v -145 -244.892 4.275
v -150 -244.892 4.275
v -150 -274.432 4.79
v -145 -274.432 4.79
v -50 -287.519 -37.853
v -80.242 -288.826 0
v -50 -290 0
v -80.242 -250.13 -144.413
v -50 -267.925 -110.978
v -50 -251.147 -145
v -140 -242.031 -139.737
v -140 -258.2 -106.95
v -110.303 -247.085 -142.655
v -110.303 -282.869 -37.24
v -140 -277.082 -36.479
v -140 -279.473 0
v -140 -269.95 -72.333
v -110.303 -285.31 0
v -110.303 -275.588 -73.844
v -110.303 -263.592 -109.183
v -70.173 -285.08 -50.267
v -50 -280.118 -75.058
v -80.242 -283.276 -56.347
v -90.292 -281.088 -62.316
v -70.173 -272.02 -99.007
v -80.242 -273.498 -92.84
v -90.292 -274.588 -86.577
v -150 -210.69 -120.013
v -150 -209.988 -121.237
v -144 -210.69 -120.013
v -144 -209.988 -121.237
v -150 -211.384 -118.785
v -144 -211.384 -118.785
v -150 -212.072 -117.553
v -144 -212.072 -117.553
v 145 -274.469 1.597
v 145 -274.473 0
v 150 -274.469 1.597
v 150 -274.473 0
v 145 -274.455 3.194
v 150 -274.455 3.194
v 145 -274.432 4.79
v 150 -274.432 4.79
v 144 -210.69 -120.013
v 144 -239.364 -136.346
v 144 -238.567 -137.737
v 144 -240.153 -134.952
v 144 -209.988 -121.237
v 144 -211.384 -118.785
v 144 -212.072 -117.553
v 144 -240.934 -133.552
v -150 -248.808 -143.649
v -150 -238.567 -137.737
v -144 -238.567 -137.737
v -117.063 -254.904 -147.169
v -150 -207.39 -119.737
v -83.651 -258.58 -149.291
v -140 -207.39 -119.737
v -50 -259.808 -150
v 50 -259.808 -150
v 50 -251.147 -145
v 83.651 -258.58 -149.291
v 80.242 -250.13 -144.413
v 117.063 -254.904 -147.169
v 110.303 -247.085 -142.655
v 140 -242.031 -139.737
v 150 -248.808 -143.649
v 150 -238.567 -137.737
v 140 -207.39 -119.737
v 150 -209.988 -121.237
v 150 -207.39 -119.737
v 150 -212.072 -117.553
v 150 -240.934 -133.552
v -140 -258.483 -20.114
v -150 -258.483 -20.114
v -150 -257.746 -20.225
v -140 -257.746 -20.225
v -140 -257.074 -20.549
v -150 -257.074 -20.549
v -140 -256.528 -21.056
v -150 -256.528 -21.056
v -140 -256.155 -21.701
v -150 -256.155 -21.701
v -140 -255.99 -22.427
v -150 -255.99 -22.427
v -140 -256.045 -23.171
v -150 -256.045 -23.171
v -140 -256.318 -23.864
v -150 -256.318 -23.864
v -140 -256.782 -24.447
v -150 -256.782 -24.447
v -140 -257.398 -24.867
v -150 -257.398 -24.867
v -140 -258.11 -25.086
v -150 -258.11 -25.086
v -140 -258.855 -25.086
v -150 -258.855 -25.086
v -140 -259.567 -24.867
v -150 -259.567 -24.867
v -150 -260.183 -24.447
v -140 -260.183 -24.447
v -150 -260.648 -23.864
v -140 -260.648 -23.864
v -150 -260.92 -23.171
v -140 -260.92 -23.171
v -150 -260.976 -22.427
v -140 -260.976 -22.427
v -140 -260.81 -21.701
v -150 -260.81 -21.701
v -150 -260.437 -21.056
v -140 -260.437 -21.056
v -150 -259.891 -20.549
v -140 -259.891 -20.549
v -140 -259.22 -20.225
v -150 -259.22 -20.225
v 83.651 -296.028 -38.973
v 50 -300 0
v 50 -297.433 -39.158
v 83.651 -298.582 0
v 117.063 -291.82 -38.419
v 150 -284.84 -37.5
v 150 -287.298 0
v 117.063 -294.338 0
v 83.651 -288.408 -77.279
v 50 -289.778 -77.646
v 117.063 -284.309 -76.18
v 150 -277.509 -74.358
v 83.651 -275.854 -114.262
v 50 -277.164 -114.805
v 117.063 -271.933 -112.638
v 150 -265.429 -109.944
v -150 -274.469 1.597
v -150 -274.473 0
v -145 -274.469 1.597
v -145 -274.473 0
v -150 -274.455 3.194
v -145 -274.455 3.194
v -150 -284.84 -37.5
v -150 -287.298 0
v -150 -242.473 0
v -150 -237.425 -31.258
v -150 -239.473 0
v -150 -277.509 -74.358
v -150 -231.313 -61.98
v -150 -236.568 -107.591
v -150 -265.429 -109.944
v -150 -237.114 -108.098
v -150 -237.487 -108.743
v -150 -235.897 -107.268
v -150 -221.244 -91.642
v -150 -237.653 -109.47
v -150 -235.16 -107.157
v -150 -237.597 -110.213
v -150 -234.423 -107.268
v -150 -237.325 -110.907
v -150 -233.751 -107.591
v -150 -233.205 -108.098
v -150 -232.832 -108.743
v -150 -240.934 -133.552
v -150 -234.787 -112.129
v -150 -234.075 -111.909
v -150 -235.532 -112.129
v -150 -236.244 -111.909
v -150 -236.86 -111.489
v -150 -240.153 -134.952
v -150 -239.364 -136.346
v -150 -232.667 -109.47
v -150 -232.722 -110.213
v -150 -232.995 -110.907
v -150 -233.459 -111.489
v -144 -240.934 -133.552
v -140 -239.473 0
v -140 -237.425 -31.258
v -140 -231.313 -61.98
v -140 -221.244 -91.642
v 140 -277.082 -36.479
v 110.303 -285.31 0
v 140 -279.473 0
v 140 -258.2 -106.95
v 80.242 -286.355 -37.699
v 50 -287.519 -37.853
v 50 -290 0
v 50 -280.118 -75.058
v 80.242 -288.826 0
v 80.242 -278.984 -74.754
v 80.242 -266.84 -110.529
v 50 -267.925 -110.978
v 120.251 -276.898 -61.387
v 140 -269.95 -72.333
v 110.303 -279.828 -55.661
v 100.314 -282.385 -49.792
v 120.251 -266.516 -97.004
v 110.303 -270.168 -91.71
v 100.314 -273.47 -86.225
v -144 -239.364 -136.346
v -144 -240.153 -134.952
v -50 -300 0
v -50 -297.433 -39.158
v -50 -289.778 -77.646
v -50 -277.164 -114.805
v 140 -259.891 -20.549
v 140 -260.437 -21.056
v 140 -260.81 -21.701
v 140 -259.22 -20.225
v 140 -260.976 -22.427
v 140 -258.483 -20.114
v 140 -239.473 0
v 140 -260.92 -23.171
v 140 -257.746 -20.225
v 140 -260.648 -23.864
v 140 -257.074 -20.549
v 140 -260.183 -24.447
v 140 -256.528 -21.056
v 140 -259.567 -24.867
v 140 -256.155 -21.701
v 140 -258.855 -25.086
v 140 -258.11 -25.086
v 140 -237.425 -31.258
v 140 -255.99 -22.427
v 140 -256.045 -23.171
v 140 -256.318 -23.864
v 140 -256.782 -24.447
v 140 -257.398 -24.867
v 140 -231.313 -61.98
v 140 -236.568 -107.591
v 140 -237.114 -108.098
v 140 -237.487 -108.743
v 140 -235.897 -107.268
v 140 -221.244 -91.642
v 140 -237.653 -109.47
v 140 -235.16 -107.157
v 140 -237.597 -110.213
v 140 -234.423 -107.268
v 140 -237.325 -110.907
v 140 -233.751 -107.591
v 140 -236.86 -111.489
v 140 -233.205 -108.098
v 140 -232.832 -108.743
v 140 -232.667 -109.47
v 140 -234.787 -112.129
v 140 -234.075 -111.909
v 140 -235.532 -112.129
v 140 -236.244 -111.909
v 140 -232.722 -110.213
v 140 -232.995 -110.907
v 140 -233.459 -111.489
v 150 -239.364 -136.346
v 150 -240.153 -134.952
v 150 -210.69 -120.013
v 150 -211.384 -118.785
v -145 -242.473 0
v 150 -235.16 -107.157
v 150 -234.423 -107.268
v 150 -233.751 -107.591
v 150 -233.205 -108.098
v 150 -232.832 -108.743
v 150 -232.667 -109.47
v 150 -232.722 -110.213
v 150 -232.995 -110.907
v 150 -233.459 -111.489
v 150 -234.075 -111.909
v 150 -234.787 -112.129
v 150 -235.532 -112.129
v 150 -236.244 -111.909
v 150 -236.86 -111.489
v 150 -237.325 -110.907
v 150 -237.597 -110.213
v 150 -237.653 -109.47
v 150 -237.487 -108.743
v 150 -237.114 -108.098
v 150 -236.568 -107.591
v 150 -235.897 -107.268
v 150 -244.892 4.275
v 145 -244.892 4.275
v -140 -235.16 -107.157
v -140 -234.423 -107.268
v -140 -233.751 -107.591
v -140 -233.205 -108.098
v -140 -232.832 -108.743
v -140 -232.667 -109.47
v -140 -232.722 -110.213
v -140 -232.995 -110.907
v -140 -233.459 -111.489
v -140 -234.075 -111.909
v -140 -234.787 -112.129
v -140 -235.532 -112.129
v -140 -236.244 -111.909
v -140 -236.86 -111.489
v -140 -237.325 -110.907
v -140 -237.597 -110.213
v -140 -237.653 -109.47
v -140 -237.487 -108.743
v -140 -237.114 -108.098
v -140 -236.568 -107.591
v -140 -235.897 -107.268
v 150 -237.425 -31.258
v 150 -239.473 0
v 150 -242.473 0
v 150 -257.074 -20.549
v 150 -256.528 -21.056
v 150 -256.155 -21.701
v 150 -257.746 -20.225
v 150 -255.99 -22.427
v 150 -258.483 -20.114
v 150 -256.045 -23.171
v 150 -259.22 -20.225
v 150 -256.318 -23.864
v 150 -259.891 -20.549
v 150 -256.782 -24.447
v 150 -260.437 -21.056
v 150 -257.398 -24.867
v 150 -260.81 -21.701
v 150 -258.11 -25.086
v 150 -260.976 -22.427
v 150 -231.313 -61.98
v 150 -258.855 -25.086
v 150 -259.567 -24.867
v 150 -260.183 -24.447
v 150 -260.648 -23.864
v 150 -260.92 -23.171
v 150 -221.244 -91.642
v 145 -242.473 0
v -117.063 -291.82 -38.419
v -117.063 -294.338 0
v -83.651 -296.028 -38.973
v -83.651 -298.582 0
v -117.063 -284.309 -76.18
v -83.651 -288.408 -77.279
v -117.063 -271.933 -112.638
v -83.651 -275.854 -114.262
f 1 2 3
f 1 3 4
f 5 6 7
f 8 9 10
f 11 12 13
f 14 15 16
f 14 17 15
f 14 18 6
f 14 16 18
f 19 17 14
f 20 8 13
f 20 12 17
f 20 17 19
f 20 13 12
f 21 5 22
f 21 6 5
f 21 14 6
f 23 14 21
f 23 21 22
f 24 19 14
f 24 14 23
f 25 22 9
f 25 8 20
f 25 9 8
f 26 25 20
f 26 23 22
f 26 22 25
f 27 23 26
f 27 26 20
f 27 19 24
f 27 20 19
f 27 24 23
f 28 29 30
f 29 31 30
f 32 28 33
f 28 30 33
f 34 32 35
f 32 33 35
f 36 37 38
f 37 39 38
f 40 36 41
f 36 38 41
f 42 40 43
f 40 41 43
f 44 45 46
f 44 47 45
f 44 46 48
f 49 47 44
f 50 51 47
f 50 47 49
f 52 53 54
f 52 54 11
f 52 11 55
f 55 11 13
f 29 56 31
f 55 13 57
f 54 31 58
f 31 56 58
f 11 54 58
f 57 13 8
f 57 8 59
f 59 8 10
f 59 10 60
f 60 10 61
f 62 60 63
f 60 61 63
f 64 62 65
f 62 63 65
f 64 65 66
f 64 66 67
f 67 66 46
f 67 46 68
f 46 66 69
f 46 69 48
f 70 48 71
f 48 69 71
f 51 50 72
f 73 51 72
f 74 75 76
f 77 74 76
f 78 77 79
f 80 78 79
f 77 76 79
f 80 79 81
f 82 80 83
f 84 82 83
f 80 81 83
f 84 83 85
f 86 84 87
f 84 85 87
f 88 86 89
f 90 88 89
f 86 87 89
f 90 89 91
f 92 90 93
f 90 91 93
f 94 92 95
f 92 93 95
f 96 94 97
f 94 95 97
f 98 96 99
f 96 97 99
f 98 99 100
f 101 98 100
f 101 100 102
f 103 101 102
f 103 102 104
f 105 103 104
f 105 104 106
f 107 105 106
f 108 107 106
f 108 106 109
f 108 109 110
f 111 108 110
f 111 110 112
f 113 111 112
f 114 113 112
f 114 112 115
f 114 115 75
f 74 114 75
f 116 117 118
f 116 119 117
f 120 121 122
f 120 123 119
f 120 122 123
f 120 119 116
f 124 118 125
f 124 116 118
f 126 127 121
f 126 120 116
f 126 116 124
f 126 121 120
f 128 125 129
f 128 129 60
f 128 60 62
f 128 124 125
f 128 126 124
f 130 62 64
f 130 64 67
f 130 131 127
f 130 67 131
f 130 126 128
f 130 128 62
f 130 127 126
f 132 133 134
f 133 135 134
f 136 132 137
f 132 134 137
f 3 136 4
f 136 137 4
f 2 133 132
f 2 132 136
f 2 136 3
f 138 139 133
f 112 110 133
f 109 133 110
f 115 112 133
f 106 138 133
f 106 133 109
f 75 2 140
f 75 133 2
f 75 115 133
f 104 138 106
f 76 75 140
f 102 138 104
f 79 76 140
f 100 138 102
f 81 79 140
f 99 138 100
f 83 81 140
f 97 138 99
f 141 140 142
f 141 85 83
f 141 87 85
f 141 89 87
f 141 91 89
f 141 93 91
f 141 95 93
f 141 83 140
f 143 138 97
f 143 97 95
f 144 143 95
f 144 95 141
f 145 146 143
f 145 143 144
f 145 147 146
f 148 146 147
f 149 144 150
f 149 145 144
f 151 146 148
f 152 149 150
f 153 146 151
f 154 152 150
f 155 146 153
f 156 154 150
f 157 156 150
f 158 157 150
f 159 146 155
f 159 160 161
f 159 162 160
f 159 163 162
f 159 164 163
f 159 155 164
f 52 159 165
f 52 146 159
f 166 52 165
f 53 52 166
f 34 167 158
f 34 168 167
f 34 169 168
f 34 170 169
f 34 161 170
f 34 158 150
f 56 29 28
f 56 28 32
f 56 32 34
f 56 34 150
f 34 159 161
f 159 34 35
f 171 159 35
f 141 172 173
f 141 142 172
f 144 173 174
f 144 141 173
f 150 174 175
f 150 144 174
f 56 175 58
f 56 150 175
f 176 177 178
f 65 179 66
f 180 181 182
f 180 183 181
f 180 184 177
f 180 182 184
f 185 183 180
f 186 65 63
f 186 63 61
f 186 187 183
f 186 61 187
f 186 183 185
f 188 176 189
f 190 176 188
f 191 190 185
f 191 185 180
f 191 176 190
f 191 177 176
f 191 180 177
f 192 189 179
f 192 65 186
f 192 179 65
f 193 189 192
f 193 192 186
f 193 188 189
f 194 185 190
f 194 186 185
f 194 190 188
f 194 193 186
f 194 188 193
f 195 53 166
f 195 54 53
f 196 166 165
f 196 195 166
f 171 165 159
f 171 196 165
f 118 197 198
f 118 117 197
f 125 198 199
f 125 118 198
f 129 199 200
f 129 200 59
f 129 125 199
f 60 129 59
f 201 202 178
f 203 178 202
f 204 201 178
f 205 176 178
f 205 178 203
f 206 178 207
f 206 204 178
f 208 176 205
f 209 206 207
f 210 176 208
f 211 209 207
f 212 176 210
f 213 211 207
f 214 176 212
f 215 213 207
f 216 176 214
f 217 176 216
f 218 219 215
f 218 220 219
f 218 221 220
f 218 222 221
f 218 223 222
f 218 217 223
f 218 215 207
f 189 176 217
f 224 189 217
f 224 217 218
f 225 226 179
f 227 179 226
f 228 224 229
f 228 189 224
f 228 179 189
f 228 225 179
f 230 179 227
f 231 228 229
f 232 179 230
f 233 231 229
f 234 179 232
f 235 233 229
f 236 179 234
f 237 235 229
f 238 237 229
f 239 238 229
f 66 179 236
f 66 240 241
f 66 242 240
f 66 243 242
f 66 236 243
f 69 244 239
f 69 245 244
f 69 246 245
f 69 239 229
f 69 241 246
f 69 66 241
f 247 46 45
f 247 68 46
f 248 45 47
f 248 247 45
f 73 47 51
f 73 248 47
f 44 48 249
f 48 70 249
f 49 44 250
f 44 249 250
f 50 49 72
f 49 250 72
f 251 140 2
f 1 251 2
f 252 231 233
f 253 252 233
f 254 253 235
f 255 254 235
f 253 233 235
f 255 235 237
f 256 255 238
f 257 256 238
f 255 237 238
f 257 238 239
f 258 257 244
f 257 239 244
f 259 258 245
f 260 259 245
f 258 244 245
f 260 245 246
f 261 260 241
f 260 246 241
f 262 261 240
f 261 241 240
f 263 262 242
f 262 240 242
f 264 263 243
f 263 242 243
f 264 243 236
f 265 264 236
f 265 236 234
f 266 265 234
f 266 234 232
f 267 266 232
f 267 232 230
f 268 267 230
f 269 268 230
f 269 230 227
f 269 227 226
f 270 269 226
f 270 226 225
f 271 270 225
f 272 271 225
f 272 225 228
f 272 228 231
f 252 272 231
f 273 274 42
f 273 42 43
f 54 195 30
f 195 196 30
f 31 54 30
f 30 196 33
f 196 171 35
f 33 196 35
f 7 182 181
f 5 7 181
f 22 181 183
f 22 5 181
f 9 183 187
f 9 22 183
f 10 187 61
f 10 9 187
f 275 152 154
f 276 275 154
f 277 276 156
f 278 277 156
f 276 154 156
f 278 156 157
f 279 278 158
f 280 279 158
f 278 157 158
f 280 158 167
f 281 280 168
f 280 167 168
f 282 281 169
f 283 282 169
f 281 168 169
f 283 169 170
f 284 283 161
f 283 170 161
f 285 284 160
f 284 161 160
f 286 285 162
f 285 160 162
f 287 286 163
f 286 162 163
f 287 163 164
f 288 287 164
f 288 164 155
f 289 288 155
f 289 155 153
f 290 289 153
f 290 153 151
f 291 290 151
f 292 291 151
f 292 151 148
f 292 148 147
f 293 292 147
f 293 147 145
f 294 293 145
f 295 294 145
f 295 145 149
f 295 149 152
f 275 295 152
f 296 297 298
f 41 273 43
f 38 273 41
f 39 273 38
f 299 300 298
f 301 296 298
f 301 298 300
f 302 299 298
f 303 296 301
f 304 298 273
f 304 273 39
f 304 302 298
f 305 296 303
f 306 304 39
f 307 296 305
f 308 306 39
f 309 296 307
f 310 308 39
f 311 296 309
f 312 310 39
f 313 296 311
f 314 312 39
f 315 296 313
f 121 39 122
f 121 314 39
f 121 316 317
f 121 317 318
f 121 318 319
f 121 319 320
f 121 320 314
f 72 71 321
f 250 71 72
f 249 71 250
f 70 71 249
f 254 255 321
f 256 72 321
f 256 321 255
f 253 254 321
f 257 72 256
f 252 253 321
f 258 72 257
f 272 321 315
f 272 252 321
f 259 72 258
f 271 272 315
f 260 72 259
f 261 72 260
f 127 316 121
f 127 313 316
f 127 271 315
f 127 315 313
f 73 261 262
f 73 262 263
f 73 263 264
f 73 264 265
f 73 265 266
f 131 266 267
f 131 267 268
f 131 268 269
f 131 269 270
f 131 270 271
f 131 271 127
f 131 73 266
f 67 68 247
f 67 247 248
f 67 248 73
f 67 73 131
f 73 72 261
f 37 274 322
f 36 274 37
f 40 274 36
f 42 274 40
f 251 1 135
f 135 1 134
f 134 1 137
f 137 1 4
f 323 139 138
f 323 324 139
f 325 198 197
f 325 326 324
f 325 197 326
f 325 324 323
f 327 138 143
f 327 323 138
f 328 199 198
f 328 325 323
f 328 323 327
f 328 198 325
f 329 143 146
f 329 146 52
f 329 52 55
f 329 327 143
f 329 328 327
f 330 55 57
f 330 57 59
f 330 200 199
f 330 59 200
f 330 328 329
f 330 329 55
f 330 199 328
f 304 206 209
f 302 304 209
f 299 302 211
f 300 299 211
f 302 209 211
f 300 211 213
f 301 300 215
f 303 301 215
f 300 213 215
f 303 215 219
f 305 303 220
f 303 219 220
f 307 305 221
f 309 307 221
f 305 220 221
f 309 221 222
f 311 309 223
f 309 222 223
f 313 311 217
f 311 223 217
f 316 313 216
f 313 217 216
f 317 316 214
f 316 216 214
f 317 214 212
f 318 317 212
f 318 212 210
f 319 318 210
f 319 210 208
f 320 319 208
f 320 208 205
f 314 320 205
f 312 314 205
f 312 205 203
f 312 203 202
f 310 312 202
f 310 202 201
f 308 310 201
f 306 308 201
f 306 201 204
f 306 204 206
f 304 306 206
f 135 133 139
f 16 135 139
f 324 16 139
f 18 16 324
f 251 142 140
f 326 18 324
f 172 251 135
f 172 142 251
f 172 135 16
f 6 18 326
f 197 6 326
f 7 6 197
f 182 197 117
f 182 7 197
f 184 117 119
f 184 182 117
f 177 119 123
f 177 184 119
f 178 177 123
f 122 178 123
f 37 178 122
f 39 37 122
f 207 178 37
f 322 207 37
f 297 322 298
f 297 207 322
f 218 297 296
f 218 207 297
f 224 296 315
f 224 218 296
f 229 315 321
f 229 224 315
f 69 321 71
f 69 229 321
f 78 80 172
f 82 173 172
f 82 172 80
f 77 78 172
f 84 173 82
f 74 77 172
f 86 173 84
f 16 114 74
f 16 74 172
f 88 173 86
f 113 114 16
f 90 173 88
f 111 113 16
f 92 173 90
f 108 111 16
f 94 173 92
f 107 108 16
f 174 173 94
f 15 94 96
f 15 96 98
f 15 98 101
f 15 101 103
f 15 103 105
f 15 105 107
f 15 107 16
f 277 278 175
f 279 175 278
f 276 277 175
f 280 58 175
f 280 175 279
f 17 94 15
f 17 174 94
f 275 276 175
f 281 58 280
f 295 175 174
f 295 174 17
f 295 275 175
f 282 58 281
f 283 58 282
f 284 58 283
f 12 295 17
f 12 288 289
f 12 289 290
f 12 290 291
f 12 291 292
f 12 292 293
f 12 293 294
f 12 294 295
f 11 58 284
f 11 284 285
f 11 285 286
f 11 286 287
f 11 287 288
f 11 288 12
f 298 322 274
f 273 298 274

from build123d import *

# Parameters (mm, degrees)
R_VOLUTION3_ANGLE                       = 30
ESQUISSE2_W                             = 5
ESQUISSE2_H                             = 32
R_VOLUTION4_ANGLE                       = 1
ESQUISSE3_W                             = 6
ESQUISSE3_H                             = 33
ENL_VEMENT_DE_MATI_RE_R_VOLUTION1_ANGLE = 1
ENL_V_MAT_EXTRU_1_DEPTH                 = 300
ESQUISSE5_R                             = 2.5
ENL_V_MAT_EXTRU_2_DEPTH                 = 300


with BuildPart() as part:
    # Esquisse1 → Révolution3 (revolve)
    with BuildSketch(Plane.XY):
        with BuildLine():
            Line((-50, -300), (50, -300))
            ThreePointArc((50, -300), (100.401716993, -296.811878507), (150, -287.298334621))
            Line((150, -287.298334621), (150, -239.47331922))
            Line((150, -239.47331922), (140, -239.47331922))
            Line((140, -239.47331922), (140, -279.47331922))
            ThreePointArc((140, -279.47331922), (95.306762763, -287.359390293), (50, -290))
            Line((50, -290), (-50, -290))
            ThreePointArc((-50, -290), (-95.306762763, -287.359390293), (-140, -279.47331922))
            Line((-140, -279.47331922), (-140, -239.47331922))
            Line((-140, -239.47331922), (-150, -239.47331922))
            Line((-150, -239.47331922), (-150, -287.298334621))
            ThreePointArc((-150, -287.298334621), (-100.401716993, -296.811878507), (-50, -300))
        make_face()
    revolve(axis=Axis((0, 0, 0), (1, 0, 0)), revolution_arc=R_VOLUTION3_ANGLE)

    # Esquisse2 → Révolution4 (revolve)
    with BuildSketch(Plane.XY):
        with Locations((-147.5, -258.47331922)):
            Rectangle(ESQUISSE2_W, ESQUISSE2_H)
        with Locations((147.5, -258.47331922)):
            Rectangle(ESQUISSE2_W, ESQUISSE2_H)
    revolve(axis=Axis((-163.497361966, 0, 0), (-1, 0, 0)), revolution_arc=R_VOLUTION4_ANGLE)

    # Esquisse3 → Enlèvement de matière-Révolution1 (revolve, cut)
    with BuildSketch(Plane(origin=(0, 0, 0), x_dir=(1, 0, 0), z_dir=(0, 0.5000000000000011, -0.8660254037844382))):
        with Locations((-147, 258.97331922)):
            Rectangle(ESQUISSE3_W, ESQUISSE3_H)
        with Locations((147, 258.97331922)):
            Rectangle(ESQUISSE3_W, ESQUISSE3_H)
    revolve(axis=Axis((-66.768740816, 0, 0), (-1, 0, 0)), revolution_arc=ENL_VEMENT_DE_MATI_RE_R_VOLUTION1_ANGLE, mode=Mode.SUBTRACT)

    # Esquisse4 → Enlèv. mat.-Extru.1 (cut)
    with BuildSketch(Plane.ZY.offset(150)):
        Polygon((0, -242.47331922), (4.27460179, -244.891772551), (4.231742917, -242.436389359), align=None)
    extrude(amount=-ENL_V_MAT_EXTRU_1_DEPTH, mode=Mode.SUBTRACT)

    # Esquisse5 → Enlèv. mat.-Extru.2 (cut)
    with BuildSketch(Plane.ZY.offset(150)):
        with Locations((-22.614300571, -258.482638314)):
            Circle(ESQUISSE5_R)
        with Locations((-109.656760374, -235.159681502)):
            Circle(ESQUISSE5_R)
    extrude(amount=-ENL_V_MAT_EXTRU_2_DEPTH, mode=Mode.SUBTRACT)


solid = part.part
